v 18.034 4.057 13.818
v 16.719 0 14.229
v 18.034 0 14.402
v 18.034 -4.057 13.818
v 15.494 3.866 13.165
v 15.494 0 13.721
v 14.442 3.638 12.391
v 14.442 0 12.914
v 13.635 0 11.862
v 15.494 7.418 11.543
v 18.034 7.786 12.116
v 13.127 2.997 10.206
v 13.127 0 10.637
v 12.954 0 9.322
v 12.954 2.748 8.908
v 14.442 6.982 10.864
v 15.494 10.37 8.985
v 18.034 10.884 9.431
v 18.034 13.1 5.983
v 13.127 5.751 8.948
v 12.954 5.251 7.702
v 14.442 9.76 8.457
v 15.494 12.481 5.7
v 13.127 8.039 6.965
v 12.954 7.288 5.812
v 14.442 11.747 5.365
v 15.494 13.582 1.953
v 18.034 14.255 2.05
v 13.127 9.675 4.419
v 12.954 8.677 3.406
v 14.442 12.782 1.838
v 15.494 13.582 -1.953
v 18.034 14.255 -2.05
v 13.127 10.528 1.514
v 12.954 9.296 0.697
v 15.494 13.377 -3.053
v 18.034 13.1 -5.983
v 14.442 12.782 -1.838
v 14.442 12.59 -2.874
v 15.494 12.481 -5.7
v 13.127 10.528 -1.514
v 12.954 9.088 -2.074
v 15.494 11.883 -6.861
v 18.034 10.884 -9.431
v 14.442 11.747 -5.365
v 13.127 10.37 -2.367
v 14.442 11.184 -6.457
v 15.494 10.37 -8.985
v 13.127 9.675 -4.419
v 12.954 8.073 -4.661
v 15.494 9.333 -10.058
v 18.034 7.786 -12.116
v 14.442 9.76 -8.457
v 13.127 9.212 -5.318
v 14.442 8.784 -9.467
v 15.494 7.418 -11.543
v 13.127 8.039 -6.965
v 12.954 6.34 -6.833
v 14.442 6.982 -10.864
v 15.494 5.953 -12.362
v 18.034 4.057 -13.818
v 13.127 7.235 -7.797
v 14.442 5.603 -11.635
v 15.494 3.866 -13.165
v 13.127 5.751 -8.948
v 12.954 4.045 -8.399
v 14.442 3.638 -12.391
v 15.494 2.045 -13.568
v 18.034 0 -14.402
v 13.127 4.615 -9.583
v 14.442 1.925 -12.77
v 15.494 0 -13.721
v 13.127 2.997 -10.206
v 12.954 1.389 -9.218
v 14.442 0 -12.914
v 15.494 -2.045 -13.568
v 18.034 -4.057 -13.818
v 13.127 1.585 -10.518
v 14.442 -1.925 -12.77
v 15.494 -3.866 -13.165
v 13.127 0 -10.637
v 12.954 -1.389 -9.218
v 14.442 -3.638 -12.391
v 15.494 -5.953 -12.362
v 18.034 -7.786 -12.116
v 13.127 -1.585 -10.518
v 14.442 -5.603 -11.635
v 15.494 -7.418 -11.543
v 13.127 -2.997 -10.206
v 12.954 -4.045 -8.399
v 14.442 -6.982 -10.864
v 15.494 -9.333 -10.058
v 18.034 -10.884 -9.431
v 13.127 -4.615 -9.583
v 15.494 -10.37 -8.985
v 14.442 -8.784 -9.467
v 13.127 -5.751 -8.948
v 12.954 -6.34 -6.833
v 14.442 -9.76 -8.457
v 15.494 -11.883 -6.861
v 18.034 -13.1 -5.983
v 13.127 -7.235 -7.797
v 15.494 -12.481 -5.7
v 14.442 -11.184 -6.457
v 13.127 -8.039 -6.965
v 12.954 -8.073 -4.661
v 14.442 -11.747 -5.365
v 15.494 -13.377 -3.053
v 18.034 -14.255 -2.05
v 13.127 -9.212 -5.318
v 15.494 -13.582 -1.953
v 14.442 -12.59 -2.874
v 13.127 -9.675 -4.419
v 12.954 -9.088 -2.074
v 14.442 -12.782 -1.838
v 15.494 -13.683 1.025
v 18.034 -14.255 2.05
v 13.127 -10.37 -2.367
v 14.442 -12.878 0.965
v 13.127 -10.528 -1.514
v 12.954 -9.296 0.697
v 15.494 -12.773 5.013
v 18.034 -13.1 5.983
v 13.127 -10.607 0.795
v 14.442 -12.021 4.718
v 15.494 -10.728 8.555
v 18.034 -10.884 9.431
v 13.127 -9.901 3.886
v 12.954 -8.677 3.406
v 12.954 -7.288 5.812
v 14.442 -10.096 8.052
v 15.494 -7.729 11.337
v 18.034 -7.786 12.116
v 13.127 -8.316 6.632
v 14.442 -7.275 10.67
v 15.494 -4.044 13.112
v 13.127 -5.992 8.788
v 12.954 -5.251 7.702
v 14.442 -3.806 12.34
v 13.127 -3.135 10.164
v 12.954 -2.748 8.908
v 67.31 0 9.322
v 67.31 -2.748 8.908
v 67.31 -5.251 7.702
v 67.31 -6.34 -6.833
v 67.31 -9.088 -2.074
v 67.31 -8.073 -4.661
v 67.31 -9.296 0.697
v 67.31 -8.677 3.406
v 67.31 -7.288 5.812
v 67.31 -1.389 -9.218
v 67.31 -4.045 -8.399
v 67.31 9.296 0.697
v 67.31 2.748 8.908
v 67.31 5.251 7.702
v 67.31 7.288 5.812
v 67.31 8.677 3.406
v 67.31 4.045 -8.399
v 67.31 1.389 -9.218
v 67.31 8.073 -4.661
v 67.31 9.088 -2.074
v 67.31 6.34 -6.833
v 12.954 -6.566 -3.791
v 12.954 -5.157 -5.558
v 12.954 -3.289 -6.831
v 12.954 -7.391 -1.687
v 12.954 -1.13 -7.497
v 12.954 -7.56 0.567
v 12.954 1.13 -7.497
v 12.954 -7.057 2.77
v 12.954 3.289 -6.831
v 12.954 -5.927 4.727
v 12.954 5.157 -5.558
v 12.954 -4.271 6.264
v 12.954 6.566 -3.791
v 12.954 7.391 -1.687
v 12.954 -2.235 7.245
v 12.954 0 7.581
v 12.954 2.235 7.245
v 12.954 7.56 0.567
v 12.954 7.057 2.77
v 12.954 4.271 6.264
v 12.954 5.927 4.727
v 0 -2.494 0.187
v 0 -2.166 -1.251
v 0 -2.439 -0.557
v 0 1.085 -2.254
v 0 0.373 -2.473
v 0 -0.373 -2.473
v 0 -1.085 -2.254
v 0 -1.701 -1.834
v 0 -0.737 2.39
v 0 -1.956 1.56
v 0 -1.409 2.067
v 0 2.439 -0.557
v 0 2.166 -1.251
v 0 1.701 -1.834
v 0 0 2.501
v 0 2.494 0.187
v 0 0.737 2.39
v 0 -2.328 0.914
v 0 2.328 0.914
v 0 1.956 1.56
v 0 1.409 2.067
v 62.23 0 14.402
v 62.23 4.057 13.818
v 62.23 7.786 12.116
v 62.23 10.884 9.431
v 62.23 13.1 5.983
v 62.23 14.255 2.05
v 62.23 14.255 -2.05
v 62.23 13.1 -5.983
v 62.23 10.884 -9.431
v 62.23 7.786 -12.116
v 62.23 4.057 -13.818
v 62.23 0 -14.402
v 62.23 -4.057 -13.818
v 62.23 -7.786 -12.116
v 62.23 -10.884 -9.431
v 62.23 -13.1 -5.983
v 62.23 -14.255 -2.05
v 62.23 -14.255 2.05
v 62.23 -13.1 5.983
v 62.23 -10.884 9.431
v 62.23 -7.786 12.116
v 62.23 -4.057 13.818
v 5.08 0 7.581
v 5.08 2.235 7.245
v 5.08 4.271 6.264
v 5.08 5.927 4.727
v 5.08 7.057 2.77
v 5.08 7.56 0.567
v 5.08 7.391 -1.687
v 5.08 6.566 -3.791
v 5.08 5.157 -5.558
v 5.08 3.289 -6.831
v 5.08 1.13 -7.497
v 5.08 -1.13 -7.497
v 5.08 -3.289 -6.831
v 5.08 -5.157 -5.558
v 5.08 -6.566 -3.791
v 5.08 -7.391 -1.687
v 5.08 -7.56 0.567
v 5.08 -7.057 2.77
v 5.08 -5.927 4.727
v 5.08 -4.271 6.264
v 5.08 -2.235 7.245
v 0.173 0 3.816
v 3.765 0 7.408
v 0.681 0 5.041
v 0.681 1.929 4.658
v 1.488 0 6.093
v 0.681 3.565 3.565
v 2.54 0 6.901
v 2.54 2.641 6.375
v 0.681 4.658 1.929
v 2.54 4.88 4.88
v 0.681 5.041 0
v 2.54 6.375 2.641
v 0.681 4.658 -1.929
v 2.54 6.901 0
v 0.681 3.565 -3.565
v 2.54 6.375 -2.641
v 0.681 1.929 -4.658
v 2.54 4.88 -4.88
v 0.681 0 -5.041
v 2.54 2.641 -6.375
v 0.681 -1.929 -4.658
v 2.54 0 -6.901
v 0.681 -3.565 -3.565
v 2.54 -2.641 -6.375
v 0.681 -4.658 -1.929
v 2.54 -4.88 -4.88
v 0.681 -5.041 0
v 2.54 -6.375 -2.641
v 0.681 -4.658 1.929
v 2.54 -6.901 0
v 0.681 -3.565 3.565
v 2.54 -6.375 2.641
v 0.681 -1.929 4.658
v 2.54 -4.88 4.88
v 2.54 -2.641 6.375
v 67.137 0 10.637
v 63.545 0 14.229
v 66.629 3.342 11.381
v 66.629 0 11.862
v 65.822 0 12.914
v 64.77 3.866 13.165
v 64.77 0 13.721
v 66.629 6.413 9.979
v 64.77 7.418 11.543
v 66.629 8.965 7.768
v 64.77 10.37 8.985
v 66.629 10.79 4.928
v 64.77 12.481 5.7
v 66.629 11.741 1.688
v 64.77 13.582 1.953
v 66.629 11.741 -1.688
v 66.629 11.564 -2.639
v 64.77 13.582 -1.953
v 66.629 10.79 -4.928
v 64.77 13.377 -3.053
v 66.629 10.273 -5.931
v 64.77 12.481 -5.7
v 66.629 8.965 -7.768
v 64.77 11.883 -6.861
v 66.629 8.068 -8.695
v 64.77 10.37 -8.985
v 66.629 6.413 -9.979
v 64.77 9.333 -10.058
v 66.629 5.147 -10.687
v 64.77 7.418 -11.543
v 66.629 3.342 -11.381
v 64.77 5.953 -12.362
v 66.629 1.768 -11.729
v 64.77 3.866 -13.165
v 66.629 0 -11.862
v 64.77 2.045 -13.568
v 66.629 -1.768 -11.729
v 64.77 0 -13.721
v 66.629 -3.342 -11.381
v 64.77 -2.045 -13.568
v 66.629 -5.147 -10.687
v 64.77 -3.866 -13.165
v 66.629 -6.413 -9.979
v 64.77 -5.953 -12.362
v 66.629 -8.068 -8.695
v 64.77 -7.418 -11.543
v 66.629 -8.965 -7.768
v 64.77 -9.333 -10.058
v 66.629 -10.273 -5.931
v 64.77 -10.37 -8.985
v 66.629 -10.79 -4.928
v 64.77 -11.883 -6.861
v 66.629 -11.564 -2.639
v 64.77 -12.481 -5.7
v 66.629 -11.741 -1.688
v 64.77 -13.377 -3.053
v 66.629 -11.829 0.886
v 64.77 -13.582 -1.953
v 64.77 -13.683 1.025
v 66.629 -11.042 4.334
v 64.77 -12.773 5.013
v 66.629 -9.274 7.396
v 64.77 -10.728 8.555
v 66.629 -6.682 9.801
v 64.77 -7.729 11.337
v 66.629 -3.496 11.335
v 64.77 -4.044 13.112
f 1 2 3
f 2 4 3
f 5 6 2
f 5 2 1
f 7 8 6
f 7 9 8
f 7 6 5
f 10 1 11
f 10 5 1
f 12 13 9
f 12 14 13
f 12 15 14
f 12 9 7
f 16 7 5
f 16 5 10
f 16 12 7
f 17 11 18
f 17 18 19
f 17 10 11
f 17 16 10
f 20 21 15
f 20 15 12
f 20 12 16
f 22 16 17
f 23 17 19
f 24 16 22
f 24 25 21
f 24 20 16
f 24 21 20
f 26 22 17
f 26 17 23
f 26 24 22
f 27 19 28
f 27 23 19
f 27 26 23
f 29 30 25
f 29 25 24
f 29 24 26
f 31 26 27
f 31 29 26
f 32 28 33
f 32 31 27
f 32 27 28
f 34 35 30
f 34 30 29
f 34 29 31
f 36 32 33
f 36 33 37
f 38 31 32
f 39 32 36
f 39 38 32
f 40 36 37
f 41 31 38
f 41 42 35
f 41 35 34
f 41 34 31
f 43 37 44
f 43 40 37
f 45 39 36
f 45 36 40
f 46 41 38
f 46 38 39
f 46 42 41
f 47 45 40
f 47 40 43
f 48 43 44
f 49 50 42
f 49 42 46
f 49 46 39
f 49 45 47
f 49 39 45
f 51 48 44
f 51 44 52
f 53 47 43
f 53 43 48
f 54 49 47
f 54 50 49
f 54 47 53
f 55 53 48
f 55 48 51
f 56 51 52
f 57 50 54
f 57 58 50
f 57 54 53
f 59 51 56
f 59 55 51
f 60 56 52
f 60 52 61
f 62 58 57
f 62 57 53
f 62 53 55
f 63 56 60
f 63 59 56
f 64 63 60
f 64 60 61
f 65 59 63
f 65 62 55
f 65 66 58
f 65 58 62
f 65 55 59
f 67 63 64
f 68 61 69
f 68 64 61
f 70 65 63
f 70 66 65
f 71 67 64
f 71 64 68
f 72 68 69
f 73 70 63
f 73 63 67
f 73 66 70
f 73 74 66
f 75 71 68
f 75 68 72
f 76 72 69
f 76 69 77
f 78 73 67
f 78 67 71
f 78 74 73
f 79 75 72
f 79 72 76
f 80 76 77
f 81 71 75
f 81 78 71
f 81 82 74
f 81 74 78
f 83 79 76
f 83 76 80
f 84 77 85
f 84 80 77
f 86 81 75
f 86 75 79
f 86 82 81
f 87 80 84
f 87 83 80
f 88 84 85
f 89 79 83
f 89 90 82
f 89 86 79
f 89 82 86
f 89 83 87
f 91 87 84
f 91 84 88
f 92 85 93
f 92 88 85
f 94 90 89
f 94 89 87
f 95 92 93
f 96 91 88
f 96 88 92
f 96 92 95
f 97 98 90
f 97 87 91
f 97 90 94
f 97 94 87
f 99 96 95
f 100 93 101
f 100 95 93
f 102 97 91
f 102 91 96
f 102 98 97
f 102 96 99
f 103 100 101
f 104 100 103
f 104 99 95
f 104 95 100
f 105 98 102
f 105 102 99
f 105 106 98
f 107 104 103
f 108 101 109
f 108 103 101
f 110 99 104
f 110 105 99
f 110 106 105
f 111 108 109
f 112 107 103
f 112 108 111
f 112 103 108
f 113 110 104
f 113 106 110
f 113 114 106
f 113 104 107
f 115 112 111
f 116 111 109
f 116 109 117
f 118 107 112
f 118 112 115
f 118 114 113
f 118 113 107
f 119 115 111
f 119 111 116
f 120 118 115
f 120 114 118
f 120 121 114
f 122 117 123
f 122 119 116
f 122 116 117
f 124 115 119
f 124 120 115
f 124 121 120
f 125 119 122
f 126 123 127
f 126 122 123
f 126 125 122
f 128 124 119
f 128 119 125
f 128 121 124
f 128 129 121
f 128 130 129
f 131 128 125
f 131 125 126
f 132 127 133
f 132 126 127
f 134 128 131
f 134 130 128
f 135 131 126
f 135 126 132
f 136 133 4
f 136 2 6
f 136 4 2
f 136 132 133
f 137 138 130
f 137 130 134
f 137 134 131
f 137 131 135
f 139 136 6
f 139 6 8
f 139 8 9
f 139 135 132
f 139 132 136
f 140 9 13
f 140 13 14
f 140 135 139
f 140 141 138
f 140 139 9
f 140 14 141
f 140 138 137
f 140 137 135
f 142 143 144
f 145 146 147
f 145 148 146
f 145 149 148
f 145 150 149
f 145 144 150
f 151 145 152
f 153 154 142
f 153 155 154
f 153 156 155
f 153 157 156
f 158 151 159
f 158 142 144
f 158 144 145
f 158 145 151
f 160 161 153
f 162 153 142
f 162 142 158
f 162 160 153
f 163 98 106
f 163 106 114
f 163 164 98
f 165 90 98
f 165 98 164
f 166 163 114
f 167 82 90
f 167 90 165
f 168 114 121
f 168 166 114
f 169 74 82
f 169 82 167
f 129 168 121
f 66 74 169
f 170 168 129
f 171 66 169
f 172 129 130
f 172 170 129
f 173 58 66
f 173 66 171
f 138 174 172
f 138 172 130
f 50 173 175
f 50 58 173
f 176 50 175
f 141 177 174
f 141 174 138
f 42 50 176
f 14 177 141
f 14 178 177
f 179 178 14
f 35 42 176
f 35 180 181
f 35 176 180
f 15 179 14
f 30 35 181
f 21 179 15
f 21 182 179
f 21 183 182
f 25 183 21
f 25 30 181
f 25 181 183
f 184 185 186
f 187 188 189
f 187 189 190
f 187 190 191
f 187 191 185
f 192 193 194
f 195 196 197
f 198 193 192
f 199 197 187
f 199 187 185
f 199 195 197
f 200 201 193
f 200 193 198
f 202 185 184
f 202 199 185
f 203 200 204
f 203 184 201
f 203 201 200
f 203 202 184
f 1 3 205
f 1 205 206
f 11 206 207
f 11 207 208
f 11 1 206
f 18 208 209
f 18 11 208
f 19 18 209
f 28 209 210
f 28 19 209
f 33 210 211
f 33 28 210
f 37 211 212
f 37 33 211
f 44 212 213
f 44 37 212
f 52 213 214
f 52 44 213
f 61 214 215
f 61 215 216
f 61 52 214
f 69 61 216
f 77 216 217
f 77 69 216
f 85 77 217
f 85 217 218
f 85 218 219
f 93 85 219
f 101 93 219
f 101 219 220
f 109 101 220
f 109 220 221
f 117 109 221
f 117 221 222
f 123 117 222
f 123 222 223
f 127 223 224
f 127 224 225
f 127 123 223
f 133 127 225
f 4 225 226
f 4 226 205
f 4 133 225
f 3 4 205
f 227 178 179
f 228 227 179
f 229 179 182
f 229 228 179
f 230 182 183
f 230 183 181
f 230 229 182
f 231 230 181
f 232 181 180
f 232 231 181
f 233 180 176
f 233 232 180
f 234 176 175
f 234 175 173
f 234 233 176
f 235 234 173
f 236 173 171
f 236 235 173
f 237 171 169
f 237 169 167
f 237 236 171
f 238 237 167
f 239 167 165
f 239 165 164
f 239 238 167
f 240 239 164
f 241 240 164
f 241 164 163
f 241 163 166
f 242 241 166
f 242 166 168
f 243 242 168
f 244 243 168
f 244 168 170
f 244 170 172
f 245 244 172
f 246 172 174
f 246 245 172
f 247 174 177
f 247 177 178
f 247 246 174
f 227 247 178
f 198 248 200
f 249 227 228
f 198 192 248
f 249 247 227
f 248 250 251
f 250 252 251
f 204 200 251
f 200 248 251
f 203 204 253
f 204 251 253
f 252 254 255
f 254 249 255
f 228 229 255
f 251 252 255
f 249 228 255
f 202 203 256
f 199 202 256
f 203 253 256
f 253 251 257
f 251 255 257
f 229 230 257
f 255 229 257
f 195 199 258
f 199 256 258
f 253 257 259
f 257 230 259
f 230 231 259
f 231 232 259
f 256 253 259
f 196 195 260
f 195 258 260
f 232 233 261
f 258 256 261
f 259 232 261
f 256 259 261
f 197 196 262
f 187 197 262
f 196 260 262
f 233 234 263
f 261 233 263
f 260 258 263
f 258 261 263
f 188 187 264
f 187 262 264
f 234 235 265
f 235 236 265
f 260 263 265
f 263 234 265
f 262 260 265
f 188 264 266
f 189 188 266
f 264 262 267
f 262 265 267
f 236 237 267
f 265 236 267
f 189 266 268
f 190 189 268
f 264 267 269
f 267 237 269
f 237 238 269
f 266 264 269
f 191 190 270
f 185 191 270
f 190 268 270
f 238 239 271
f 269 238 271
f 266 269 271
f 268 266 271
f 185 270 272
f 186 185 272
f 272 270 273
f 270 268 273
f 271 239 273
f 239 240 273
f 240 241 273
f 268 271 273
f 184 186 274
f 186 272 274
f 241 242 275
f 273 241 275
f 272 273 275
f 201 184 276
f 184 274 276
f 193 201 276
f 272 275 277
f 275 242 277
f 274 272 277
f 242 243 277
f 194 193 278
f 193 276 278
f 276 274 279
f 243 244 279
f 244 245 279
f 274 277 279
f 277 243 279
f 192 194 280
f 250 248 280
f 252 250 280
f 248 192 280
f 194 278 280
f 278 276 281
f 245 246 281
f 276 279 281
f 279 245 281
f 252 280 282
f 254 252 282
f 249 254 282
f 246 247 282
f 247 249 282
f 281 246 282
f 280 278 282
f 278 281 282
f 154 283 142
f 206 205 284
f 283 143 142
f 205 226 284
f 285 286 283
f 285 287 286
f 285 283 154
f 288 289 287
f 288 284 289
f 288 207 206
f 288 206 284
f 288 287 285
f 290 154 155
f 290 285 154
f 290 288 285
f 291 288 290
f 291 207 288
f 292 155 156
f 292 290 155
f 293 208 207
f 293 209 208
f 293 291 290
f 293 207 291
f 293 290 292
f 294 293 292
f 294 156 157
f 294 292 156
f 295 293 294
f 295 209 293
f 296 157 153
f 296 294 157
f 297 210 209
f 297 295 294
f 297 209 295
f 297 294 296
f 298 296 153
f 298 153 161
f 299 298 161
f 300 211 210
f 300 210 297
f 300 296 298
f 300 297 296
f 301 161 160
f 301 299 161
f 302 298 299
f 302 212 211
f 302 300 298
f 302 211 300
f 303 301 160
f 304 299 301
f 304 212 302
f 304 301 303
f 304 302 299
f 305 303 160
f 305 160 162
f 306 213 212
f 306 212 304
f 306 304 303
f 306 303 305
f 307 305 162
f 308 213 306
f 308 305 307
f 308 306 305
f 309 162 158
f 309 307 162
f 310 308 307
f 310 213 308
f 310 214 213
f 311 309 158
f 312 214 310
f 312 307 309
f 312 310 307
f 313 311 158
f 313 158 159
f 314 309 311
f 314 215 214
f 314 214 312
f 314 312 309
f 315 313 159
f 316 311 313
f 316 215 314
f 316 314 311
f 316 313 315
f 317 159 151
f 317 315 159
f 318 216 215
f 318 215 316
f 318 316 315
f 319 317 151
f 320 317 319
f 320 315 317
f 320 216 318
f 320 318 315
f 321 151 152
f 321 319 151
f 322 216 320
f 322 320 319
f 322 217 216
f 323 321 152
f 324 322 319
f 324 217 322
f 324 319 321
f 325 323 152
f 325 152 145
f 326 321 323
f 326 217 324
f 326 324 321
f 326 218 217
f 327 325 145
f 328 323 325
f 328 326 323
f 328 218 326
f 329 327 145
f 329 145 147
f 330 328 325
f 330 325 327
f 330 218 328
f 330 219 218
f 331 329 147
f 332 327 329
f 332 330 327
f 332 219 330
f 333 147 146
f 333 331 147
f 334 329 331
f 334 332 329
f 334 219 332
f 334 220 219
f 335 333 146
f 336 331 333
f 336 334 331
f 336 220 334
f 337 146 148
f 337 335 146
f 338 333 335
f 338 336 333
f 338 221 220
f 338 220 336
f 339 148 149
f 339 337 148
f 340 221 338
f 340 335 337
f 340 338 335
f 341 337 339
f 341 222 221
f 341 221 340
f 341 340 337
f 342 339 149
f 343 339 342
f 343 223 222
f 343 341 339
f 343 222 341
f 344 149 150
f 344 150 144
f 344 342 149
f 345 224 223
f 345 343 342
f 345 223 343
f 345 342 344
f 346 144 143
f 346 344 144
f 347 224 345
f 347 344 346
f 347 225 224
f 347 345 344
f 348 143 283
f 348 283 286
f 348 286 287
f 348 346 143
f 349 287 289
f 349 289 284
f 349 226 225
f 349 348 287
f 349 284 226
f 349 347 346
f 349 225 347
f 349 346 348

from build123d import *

# Parameters (mm, degrees)
F2_R = 5.08


with BuildPart() as f1:
    # F0 (on Front) → F1 (revolve)
    with BuildSketch(Plane.XZ):
        Polygon((0, 7.581339), (0, 0), (67.31, 0), (67.31, 14.4018), (12.954, 14.4018), (12.954, 7.581339), align=None)
    revolve(axis=Axis((33.655, 0, 0), (-1, 0, 0)))

    # F2
    f2_edges = [f1.edges().sort_by_distance(p)[0] for p in [
        (67.31, 0, -14.4018),
        (12.954, 0, -14.4018),
        (40.132, 0, 14.4018),
        (0, 0, -7.581339),
    ]]
    fillet(f2_edges, radius=F2_R)


solid = f1.part
